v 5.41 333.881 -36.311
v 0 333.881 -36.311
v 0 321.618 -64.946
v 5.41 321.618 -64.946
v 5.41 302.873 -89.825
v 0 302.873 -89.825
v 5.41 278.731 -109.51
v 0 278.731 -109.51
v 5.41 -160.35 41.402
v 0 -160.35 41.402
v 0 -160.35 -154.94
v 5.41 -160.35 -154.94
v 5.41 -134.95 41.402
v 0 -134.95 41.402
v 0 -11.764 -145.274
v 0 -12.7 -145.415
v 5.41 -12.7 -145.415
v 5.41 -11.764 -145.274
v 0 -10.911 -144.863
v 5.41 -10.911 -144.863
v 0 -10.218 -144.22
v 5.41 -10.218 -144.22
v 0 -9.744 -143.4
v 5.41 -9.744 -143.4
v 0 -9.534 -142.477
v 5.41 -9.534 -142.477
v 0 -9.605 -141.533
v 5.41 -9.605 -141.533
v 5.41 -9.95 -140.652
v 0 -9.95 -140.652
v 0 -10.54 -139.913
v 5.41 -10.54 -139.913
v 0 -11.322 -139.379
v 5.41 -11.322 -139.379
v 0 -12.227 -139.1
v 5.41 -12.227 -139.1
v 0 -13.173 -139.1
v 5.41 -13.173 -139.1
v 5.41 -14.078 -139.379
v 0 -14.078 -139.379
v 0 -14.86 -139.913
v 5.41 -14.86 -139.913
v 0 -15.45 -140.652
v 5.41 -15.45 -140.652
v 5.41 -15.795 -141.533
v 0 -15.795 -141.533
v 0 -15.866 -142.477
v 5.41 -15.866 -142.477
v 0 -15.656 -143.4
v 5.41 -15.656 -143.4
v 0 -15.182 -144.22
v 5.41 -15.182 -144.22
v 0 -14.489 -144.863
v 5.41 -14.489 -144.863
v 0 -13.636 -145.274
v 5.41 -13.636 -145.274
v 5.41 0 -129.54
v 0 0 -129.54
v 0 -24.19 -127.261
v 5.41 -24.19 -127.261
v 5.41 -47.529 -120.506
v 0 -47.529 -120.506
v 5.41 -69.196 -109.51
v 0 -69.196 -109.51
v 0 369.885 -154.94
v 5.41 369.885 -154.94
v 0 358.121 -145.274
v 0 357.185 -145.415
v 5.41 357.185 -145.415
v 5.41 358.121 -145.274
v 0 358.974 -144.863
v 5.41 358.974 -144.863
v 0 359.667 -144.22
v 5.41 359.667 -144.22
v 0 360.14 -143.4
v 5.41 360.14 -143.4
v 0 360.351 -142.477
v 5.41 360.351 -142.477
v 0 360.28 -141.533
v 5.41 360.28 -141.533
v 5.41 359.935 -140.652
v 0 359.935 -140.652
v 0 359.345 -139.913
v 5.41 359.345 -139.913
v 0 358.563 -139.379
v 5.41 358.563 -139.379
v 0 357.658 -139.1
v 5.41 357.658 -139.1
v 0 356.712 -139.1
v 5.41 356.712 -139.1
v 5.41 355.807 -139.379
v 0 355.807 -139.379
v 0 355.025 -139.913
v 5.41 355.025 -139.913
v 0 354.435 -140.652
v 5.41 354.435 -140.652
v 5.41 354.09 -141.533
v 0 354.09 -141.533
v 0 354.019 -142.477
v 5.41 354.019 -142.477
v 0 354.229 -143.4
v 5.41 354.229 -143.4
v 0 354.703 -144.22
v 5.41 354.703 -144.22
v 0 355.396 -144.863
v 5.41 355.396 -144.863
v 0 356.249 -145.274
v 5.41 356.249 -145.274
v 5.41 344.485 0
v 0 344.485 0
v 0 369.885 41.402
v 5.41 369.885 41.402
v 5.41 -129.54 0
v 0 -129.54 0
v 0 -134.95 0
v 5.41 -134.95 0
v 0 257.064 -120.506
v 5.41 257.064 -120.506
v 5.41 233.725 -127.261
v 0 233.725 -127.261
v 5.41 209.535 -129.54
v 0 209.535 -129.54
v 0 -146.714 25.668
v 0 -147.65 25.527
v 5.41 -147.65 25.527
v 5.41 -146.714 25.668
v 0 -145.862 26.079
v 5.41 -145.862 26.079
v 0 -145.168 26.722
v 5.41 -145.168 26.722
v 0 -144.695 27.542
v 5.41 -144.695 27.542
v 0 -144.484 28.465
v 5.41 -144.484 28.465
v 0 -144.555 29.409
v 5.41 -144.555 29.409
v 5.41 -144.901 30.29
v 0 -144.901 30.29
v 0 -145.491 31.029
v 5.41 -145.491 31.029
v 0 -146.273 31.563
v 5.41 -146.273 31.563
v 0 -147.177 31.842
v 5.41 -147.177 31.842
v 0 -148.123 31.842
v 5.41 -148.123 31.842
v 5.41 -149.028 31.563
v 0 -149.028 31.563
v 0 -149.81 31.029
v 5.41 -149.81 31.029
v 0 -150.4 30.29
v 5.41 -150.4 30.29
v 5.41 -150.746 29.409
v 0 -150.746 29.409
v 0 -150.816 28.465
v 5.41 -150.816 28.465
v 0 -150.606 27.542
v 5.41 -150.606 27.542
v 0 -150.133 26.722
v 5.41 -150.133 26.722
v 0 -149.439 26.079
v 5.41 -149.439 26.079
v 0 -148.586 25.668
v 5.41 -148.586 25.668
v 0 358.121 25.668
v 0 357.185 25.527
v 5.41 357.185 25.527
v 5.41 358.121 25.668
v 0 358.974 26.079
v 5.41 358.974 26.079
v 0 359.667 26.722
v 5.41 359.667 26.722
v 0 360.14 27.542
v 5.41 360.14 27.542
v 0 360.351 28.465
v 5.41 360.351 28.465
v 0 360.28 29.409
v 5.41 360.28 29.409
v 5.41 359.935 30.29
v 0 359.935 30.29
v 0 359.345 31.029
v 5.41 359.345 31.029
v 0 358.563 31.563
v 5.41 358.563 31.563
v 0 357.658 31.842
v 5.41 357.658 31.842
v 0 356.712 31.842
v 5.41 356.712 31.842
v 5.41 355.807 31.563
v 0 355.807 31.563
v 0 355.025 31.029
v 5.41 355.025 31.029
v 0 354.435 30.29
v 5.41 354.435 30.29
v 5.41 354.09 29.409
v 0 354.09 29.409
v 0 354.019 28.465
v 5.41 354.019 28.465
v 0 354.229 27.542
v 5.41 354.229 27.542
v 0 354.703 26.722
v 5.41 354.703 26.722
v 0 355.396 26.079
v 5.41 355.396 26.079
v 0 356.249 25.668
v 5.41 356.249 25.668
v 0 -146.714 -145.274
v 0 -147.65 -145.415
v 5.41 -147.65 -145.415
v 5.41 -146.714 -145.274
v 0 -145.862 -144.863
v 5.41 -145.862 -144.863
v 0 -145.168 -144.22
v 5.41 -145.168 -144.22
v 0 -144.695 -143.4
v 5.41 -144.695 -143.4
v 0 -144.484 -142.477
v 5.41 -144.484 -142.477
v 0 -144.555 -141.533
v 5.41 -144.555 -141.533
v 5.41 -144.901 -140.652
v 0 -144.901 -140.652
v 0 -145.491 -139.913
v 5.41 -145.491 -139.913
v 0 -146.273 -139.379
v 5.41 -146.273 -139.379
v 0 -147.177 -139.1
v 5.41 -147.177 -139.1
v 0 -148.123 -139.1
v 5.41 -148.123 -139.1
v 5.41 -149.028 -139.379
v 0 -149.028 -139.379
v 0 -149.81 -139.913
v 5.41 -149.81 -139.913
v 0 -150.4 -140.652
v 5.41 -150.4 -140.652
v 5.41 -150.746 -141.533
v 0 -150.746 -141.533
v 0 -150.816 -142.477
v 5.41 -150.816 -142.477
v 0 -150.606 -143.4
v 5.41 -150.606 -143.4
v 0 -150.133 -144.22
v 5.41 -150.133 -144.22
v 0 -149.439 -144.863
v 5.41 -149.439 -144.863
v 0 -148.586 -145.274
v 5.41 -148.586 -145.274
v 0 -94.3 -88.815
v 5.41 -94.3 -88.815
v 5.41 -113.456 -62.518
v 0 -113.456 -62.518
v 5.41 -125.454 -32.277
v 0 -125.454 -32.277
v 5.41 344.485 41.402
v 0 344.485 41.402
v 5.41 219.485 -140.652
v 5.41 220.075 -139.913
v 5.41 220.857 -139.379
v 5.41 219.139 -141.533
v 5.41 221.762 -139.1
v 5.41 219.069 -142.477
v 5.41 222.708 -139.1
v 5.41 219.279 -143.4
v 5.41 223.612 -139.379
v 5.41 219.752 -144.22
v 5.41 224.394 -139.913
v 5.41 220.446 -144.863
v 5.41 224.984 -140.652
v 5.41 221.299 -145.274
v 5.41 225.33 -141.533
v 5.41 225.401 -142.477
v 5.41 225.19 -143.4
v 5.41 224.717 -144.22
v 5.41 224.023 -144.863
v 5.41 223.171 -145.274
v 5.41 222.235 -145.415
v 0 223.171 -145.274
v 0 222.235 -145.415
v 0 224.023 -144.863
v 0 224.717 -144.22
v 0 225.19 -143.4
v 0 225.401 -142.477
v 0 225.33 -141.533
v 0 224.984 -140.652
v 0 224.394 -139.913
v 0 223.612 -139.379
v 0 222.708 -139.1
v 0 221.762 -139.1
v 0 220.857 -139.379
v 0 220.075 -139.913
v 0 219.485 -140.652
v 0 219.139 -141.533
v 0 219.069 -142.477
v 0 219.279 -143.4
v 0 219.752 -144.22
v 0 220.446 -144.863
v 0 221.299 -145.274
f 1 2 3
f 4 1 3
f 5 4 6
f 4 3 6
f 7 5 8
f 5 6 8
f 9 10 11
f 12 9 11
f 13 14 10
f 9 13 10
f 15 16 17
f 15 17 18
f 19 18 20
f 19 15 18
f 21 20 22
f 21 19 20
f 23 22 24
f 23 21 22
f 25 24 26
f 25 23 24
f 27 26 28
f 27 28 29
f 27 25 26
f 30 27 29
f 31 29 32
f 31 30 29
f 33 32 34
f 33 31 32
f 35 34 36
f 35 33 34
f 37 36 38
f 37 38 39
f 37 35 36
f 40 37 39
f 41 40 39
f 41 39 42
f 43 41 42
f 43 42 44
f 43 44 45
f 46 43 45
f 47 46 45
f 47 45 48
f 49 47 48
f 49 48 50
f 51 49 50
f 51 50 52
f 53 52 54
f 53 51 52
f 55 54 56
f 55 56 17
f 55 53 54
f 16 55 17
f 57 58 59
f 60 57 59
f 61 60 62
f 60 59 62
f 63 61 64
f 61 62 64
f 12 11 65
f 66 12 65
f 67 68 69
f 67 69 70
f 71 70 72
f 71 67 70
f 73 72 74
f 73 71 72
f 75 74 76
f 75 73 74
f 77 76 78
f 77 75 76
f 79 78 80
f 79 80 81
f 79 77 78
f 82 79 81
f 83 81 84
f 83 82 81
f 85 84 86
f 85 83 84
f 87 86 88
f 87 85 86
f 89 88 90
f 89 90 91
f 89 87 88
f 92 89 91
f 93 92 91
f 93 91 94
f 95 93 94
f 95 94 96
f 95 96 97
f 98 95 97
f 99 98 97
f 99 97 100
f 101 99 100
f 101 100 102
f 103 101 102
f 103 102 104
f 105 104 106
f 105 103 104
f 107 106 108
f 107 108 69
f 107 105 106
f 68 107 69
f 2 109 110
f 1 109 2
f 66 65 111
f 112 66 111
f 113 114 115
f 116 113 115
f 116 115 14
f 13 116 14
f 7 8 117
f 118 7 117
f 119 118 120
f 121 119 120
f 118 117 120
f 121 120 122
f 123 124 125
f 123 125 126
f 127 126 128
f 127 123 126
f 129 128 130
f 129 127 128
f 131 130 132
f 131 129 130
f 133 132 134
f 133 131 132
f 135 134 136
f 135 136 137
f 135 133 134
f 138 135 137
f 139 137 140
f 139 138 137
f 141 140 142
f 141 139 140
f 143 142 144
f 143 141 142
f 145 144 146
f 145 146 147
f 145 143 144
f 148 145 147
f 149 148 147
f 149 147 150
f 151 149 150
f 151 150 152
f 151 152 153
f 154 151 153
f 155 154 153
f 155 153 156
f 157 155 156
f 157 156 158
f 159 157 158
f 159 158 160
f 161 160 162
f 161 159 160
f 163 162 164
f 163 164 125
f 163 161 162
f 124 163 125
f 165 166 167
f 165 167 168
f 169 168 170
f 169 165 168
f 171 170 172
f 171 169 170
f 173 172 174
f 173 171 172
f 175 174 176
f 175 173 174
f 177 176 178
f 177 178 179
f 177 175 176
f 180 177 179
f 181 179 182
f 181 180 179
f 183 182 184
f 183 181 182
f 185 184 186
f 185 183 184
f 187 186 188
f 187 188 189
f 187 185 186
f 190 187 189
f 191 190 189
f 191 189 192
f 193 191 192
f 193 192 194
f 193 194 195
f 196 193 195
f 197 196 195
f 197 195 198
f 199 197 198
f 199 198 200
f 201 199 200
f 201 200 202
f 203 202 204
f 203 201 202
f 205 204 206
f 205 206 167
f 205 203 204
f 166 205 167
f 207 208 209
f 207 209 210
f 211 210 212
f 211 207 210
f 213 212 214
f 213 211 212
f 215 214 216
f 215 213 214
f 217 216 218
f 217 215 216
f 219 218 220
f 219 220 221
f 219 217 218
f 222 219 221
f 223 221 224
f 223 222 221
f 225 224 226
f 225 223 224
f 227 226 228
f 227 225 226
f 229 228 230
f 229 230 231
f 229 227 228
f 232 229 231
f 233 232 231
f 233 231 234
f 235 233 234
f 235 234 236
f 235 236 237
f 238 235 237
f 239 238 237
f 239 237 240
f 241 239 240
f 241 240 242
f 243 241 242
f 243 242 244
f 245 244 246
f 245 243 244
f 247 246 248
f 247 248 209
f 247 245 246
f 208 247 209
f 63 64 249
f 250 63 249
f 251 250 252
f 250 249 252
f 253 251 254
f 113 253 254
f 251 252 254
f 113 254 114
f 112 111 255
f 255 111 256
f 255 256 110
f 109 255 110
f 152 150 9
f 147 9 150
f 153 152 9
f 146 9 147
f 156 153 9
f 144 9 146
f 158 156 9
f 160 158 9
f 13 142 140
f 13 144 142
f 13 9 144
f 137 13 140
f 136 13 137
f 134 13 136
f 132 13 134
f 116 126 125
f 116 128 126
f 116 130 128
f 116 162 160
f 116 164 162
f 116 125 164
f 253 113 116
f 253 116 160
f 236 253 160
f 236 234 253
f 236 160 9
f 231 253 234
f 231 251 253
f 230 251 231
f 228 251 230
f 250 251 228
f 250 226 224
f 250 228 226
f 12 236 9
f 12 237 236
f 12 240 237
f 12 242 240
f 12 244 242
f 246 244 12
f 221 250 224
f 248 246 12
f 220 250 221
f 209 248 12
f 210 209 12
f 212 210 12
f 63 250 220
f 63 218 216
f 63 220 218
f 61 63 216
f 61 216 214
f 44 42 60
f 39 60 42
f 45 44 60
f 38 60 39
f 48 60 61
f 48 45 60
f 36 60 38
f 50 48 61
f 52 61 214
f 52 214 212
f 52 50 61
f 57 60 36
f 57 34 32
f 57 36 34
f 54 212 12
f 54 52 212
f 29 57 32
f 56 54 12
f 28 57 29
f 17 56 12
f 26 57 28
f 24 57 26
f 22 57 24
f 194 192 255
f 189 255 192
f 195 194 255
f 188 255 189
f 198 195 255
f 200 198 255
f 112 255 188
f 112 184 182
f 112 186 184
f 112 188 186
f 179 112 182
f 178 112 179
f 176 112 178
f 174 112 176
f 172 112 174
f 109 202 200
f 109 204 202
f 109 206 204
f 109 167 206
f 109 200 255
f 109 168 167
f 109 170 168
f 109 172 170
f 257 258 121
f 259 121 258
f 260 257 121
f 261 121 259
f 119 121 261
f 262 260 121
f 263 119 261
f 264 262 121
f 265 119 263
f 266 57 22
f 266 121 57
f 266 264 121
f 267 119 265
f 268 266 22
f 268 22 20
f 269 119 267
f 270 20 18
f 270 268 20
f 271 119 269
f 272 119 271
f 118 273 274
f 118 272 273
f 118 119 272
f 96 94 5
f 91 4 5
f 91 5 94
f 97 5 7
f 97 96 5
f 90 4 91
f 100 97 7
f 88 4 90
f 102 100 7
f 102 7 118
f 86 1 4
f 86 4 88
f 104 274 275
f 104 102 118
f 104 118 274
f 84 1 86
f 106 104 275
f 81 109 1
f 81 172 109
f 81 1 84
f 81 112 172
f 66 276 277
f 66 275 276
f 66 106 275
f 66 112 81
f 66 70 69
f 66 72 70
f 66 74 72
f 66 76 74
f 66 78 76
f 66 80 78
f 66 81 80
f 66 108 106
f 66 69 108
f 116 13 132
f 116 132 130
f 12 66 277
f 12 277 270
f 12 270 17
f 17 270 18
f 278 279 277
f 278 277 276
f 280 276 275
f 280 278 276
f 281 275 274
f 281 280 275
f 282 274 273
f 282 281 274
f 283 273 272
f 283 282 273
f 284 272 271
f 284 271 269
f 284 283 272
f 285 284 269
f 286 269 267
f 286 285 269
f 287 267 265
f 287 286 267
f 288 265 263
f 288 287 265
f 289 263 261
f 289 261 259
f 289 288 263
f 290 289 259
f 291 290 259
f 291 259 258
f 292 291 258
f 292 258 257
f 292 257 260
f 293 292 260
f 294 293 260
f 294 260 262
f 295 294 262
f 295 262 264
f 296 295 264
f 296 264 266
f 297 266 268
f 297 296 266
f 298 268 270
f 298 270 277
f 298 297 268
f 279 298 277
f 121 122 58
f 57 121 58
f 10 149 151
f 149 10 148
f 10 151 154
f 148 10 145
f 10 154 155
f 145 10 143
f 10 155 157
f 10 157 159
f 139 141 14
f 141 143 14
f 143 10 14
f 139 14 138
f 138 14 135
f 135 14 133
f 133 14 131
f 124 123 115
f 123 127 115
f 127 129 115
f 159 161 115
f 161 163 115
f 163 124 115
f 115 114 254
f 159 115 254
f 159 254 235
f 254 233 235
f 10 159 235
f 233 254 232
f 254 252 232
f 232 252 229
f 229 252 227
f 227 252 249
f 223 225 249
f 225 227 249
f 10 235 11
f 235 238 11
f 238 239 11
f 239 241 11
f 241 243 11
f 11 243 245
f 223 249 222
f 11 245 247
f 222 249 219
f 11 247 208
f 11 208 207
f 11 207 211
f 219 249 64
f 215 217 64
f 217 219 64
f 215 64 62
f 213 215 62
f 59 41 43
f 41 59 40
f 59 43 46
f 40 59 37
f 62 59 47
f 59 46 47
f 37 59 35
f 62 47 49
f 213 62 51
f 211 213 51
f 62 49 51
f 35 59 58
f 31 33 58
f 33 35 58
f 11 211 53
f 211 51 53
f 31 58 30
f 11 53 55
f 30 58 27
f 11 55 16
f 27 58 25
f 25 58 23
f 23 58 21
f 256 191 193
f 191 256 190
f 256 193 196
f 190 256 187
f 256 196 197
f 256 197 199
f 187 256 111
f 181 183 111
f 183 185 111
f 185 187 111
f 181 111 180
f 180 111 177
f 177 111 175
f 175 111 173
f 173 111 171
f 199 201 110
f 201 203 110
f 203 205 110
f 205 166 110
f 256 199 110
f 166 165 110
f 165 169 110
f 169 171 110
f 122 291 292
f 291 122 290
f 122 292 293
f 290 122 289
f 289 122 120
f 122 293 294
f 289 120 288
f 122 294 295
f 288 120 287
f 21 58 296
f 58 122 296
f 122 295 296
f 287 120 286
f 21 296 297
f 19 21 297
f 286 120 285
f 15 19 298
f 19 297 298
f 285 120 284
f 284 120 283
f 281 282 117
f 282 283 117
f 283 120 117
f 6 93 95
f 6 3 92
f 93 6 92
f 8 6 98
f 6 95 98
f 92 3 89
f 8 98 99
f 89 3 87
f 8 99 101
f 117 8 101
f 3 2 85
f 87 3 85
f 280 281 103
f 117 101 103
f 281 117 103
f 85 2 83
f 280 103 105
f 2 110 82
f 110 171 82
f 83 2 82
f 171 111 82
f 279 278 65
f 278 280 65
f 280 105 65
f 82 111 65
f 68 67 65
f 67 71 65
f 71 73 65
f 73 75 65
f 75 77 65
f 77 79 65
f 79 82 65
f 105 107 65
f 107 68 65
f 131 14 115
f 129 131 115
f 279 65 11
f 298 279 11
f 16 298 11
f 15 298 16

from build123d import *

# Parameters (mm, degrees)
SKETCH1_R           = 3.175
BOSS_EXTRUDE3_DEPTH = 5.4102
CUT_EXTRUDE1_DEPTH  = 5.4102


with BuildPart() as part:
    # Sketch1 → Boss-Extrude3 (new body)
    with BuildSketch(Plane(origin=(0, 0, 0), x_dir=(0, 0, -1), z_dir=(1, 0, 0))):
        with BuildLine():
            ThreePointArc((129.54, 0), (124.431830765, -36.01848265), (109.510185389, -69.196321406))
            ThreePointArc((109.510185389, -69.196321406), (62.517678, -113.455504659), (0, -129.54))
            Line((0, -129.54), (0, -134.9502))
            Line((0, -134.9502), (-41.402, -134.9502))
            Line((-41.402, -134.9502), (-41.402, -160.3502))
            Line((-41.402, -160.3502), (154.94, -160.3502))
            Line((154.94, -160.3502), (154.94, 369.88496))
            Line((154.94, 369.88496), (-41.402, 369.88496))
            Line((-41.402, 369.88496), (-41.402, 344.48496))
            Line((-41.402, 344.48496), (0, 344.48496))
            Line((0, 344.48496), (0, 339.07476))
            ThreePointArc((0, 339.07476), (62.517678, 322.990264659), (109.510185389, 278.731081406))
            ThreePointArc((109.510185389, 278.731081406), (124.431830765, 245.55324265), (129.54, 209.53476))
            Line((129.54, 209.53476), (129.54, 0))
        make_face()
        with Locations((-28.702, -147.6502)):
            Circle(SKETCH1_R, mode=Mode.SUBTRACT)
        with Locations((142.24, -147.6502)):
            Circle(SKETCH1_R, mode=Mode.SUBTRACT)
        with Locations((142.24, -12.7)):
            Circle(SKETCH1_R, mode=Mode.SUBTRACT)
        with Locations((-28.702, 357.18496)):
            Circle(SKETCH1_R, mode=Mode.SUBTRACT)
        with Locations((142.24, 222.23476)):
            Circle(SKETCH1_R, mode=Mode.SUBTRACT)
        with Locations((142.24, 357.18496)):
            Circle(SKETCH1_R, mode=Mode.SUBTRACT)
    extrude(amount=BOSS_EXTRUDE3_DEPTH)

    # Sketch2 → Cut-Extrude1 (cut)
    with BuildSketch(Plane(origin=(5.4102, 0, 0), x_dir=(0, 0, -1), z_dir=(1, 0, 0))):
        Polygon((0, 344.48496), (36.311280568, 333.881462825), (0, 339.07476), align=None)
    extrude(amount=-CUT_EXTRUDE1_DEPTH, mode=Mode.SUBTRACT)


solid = part.part
